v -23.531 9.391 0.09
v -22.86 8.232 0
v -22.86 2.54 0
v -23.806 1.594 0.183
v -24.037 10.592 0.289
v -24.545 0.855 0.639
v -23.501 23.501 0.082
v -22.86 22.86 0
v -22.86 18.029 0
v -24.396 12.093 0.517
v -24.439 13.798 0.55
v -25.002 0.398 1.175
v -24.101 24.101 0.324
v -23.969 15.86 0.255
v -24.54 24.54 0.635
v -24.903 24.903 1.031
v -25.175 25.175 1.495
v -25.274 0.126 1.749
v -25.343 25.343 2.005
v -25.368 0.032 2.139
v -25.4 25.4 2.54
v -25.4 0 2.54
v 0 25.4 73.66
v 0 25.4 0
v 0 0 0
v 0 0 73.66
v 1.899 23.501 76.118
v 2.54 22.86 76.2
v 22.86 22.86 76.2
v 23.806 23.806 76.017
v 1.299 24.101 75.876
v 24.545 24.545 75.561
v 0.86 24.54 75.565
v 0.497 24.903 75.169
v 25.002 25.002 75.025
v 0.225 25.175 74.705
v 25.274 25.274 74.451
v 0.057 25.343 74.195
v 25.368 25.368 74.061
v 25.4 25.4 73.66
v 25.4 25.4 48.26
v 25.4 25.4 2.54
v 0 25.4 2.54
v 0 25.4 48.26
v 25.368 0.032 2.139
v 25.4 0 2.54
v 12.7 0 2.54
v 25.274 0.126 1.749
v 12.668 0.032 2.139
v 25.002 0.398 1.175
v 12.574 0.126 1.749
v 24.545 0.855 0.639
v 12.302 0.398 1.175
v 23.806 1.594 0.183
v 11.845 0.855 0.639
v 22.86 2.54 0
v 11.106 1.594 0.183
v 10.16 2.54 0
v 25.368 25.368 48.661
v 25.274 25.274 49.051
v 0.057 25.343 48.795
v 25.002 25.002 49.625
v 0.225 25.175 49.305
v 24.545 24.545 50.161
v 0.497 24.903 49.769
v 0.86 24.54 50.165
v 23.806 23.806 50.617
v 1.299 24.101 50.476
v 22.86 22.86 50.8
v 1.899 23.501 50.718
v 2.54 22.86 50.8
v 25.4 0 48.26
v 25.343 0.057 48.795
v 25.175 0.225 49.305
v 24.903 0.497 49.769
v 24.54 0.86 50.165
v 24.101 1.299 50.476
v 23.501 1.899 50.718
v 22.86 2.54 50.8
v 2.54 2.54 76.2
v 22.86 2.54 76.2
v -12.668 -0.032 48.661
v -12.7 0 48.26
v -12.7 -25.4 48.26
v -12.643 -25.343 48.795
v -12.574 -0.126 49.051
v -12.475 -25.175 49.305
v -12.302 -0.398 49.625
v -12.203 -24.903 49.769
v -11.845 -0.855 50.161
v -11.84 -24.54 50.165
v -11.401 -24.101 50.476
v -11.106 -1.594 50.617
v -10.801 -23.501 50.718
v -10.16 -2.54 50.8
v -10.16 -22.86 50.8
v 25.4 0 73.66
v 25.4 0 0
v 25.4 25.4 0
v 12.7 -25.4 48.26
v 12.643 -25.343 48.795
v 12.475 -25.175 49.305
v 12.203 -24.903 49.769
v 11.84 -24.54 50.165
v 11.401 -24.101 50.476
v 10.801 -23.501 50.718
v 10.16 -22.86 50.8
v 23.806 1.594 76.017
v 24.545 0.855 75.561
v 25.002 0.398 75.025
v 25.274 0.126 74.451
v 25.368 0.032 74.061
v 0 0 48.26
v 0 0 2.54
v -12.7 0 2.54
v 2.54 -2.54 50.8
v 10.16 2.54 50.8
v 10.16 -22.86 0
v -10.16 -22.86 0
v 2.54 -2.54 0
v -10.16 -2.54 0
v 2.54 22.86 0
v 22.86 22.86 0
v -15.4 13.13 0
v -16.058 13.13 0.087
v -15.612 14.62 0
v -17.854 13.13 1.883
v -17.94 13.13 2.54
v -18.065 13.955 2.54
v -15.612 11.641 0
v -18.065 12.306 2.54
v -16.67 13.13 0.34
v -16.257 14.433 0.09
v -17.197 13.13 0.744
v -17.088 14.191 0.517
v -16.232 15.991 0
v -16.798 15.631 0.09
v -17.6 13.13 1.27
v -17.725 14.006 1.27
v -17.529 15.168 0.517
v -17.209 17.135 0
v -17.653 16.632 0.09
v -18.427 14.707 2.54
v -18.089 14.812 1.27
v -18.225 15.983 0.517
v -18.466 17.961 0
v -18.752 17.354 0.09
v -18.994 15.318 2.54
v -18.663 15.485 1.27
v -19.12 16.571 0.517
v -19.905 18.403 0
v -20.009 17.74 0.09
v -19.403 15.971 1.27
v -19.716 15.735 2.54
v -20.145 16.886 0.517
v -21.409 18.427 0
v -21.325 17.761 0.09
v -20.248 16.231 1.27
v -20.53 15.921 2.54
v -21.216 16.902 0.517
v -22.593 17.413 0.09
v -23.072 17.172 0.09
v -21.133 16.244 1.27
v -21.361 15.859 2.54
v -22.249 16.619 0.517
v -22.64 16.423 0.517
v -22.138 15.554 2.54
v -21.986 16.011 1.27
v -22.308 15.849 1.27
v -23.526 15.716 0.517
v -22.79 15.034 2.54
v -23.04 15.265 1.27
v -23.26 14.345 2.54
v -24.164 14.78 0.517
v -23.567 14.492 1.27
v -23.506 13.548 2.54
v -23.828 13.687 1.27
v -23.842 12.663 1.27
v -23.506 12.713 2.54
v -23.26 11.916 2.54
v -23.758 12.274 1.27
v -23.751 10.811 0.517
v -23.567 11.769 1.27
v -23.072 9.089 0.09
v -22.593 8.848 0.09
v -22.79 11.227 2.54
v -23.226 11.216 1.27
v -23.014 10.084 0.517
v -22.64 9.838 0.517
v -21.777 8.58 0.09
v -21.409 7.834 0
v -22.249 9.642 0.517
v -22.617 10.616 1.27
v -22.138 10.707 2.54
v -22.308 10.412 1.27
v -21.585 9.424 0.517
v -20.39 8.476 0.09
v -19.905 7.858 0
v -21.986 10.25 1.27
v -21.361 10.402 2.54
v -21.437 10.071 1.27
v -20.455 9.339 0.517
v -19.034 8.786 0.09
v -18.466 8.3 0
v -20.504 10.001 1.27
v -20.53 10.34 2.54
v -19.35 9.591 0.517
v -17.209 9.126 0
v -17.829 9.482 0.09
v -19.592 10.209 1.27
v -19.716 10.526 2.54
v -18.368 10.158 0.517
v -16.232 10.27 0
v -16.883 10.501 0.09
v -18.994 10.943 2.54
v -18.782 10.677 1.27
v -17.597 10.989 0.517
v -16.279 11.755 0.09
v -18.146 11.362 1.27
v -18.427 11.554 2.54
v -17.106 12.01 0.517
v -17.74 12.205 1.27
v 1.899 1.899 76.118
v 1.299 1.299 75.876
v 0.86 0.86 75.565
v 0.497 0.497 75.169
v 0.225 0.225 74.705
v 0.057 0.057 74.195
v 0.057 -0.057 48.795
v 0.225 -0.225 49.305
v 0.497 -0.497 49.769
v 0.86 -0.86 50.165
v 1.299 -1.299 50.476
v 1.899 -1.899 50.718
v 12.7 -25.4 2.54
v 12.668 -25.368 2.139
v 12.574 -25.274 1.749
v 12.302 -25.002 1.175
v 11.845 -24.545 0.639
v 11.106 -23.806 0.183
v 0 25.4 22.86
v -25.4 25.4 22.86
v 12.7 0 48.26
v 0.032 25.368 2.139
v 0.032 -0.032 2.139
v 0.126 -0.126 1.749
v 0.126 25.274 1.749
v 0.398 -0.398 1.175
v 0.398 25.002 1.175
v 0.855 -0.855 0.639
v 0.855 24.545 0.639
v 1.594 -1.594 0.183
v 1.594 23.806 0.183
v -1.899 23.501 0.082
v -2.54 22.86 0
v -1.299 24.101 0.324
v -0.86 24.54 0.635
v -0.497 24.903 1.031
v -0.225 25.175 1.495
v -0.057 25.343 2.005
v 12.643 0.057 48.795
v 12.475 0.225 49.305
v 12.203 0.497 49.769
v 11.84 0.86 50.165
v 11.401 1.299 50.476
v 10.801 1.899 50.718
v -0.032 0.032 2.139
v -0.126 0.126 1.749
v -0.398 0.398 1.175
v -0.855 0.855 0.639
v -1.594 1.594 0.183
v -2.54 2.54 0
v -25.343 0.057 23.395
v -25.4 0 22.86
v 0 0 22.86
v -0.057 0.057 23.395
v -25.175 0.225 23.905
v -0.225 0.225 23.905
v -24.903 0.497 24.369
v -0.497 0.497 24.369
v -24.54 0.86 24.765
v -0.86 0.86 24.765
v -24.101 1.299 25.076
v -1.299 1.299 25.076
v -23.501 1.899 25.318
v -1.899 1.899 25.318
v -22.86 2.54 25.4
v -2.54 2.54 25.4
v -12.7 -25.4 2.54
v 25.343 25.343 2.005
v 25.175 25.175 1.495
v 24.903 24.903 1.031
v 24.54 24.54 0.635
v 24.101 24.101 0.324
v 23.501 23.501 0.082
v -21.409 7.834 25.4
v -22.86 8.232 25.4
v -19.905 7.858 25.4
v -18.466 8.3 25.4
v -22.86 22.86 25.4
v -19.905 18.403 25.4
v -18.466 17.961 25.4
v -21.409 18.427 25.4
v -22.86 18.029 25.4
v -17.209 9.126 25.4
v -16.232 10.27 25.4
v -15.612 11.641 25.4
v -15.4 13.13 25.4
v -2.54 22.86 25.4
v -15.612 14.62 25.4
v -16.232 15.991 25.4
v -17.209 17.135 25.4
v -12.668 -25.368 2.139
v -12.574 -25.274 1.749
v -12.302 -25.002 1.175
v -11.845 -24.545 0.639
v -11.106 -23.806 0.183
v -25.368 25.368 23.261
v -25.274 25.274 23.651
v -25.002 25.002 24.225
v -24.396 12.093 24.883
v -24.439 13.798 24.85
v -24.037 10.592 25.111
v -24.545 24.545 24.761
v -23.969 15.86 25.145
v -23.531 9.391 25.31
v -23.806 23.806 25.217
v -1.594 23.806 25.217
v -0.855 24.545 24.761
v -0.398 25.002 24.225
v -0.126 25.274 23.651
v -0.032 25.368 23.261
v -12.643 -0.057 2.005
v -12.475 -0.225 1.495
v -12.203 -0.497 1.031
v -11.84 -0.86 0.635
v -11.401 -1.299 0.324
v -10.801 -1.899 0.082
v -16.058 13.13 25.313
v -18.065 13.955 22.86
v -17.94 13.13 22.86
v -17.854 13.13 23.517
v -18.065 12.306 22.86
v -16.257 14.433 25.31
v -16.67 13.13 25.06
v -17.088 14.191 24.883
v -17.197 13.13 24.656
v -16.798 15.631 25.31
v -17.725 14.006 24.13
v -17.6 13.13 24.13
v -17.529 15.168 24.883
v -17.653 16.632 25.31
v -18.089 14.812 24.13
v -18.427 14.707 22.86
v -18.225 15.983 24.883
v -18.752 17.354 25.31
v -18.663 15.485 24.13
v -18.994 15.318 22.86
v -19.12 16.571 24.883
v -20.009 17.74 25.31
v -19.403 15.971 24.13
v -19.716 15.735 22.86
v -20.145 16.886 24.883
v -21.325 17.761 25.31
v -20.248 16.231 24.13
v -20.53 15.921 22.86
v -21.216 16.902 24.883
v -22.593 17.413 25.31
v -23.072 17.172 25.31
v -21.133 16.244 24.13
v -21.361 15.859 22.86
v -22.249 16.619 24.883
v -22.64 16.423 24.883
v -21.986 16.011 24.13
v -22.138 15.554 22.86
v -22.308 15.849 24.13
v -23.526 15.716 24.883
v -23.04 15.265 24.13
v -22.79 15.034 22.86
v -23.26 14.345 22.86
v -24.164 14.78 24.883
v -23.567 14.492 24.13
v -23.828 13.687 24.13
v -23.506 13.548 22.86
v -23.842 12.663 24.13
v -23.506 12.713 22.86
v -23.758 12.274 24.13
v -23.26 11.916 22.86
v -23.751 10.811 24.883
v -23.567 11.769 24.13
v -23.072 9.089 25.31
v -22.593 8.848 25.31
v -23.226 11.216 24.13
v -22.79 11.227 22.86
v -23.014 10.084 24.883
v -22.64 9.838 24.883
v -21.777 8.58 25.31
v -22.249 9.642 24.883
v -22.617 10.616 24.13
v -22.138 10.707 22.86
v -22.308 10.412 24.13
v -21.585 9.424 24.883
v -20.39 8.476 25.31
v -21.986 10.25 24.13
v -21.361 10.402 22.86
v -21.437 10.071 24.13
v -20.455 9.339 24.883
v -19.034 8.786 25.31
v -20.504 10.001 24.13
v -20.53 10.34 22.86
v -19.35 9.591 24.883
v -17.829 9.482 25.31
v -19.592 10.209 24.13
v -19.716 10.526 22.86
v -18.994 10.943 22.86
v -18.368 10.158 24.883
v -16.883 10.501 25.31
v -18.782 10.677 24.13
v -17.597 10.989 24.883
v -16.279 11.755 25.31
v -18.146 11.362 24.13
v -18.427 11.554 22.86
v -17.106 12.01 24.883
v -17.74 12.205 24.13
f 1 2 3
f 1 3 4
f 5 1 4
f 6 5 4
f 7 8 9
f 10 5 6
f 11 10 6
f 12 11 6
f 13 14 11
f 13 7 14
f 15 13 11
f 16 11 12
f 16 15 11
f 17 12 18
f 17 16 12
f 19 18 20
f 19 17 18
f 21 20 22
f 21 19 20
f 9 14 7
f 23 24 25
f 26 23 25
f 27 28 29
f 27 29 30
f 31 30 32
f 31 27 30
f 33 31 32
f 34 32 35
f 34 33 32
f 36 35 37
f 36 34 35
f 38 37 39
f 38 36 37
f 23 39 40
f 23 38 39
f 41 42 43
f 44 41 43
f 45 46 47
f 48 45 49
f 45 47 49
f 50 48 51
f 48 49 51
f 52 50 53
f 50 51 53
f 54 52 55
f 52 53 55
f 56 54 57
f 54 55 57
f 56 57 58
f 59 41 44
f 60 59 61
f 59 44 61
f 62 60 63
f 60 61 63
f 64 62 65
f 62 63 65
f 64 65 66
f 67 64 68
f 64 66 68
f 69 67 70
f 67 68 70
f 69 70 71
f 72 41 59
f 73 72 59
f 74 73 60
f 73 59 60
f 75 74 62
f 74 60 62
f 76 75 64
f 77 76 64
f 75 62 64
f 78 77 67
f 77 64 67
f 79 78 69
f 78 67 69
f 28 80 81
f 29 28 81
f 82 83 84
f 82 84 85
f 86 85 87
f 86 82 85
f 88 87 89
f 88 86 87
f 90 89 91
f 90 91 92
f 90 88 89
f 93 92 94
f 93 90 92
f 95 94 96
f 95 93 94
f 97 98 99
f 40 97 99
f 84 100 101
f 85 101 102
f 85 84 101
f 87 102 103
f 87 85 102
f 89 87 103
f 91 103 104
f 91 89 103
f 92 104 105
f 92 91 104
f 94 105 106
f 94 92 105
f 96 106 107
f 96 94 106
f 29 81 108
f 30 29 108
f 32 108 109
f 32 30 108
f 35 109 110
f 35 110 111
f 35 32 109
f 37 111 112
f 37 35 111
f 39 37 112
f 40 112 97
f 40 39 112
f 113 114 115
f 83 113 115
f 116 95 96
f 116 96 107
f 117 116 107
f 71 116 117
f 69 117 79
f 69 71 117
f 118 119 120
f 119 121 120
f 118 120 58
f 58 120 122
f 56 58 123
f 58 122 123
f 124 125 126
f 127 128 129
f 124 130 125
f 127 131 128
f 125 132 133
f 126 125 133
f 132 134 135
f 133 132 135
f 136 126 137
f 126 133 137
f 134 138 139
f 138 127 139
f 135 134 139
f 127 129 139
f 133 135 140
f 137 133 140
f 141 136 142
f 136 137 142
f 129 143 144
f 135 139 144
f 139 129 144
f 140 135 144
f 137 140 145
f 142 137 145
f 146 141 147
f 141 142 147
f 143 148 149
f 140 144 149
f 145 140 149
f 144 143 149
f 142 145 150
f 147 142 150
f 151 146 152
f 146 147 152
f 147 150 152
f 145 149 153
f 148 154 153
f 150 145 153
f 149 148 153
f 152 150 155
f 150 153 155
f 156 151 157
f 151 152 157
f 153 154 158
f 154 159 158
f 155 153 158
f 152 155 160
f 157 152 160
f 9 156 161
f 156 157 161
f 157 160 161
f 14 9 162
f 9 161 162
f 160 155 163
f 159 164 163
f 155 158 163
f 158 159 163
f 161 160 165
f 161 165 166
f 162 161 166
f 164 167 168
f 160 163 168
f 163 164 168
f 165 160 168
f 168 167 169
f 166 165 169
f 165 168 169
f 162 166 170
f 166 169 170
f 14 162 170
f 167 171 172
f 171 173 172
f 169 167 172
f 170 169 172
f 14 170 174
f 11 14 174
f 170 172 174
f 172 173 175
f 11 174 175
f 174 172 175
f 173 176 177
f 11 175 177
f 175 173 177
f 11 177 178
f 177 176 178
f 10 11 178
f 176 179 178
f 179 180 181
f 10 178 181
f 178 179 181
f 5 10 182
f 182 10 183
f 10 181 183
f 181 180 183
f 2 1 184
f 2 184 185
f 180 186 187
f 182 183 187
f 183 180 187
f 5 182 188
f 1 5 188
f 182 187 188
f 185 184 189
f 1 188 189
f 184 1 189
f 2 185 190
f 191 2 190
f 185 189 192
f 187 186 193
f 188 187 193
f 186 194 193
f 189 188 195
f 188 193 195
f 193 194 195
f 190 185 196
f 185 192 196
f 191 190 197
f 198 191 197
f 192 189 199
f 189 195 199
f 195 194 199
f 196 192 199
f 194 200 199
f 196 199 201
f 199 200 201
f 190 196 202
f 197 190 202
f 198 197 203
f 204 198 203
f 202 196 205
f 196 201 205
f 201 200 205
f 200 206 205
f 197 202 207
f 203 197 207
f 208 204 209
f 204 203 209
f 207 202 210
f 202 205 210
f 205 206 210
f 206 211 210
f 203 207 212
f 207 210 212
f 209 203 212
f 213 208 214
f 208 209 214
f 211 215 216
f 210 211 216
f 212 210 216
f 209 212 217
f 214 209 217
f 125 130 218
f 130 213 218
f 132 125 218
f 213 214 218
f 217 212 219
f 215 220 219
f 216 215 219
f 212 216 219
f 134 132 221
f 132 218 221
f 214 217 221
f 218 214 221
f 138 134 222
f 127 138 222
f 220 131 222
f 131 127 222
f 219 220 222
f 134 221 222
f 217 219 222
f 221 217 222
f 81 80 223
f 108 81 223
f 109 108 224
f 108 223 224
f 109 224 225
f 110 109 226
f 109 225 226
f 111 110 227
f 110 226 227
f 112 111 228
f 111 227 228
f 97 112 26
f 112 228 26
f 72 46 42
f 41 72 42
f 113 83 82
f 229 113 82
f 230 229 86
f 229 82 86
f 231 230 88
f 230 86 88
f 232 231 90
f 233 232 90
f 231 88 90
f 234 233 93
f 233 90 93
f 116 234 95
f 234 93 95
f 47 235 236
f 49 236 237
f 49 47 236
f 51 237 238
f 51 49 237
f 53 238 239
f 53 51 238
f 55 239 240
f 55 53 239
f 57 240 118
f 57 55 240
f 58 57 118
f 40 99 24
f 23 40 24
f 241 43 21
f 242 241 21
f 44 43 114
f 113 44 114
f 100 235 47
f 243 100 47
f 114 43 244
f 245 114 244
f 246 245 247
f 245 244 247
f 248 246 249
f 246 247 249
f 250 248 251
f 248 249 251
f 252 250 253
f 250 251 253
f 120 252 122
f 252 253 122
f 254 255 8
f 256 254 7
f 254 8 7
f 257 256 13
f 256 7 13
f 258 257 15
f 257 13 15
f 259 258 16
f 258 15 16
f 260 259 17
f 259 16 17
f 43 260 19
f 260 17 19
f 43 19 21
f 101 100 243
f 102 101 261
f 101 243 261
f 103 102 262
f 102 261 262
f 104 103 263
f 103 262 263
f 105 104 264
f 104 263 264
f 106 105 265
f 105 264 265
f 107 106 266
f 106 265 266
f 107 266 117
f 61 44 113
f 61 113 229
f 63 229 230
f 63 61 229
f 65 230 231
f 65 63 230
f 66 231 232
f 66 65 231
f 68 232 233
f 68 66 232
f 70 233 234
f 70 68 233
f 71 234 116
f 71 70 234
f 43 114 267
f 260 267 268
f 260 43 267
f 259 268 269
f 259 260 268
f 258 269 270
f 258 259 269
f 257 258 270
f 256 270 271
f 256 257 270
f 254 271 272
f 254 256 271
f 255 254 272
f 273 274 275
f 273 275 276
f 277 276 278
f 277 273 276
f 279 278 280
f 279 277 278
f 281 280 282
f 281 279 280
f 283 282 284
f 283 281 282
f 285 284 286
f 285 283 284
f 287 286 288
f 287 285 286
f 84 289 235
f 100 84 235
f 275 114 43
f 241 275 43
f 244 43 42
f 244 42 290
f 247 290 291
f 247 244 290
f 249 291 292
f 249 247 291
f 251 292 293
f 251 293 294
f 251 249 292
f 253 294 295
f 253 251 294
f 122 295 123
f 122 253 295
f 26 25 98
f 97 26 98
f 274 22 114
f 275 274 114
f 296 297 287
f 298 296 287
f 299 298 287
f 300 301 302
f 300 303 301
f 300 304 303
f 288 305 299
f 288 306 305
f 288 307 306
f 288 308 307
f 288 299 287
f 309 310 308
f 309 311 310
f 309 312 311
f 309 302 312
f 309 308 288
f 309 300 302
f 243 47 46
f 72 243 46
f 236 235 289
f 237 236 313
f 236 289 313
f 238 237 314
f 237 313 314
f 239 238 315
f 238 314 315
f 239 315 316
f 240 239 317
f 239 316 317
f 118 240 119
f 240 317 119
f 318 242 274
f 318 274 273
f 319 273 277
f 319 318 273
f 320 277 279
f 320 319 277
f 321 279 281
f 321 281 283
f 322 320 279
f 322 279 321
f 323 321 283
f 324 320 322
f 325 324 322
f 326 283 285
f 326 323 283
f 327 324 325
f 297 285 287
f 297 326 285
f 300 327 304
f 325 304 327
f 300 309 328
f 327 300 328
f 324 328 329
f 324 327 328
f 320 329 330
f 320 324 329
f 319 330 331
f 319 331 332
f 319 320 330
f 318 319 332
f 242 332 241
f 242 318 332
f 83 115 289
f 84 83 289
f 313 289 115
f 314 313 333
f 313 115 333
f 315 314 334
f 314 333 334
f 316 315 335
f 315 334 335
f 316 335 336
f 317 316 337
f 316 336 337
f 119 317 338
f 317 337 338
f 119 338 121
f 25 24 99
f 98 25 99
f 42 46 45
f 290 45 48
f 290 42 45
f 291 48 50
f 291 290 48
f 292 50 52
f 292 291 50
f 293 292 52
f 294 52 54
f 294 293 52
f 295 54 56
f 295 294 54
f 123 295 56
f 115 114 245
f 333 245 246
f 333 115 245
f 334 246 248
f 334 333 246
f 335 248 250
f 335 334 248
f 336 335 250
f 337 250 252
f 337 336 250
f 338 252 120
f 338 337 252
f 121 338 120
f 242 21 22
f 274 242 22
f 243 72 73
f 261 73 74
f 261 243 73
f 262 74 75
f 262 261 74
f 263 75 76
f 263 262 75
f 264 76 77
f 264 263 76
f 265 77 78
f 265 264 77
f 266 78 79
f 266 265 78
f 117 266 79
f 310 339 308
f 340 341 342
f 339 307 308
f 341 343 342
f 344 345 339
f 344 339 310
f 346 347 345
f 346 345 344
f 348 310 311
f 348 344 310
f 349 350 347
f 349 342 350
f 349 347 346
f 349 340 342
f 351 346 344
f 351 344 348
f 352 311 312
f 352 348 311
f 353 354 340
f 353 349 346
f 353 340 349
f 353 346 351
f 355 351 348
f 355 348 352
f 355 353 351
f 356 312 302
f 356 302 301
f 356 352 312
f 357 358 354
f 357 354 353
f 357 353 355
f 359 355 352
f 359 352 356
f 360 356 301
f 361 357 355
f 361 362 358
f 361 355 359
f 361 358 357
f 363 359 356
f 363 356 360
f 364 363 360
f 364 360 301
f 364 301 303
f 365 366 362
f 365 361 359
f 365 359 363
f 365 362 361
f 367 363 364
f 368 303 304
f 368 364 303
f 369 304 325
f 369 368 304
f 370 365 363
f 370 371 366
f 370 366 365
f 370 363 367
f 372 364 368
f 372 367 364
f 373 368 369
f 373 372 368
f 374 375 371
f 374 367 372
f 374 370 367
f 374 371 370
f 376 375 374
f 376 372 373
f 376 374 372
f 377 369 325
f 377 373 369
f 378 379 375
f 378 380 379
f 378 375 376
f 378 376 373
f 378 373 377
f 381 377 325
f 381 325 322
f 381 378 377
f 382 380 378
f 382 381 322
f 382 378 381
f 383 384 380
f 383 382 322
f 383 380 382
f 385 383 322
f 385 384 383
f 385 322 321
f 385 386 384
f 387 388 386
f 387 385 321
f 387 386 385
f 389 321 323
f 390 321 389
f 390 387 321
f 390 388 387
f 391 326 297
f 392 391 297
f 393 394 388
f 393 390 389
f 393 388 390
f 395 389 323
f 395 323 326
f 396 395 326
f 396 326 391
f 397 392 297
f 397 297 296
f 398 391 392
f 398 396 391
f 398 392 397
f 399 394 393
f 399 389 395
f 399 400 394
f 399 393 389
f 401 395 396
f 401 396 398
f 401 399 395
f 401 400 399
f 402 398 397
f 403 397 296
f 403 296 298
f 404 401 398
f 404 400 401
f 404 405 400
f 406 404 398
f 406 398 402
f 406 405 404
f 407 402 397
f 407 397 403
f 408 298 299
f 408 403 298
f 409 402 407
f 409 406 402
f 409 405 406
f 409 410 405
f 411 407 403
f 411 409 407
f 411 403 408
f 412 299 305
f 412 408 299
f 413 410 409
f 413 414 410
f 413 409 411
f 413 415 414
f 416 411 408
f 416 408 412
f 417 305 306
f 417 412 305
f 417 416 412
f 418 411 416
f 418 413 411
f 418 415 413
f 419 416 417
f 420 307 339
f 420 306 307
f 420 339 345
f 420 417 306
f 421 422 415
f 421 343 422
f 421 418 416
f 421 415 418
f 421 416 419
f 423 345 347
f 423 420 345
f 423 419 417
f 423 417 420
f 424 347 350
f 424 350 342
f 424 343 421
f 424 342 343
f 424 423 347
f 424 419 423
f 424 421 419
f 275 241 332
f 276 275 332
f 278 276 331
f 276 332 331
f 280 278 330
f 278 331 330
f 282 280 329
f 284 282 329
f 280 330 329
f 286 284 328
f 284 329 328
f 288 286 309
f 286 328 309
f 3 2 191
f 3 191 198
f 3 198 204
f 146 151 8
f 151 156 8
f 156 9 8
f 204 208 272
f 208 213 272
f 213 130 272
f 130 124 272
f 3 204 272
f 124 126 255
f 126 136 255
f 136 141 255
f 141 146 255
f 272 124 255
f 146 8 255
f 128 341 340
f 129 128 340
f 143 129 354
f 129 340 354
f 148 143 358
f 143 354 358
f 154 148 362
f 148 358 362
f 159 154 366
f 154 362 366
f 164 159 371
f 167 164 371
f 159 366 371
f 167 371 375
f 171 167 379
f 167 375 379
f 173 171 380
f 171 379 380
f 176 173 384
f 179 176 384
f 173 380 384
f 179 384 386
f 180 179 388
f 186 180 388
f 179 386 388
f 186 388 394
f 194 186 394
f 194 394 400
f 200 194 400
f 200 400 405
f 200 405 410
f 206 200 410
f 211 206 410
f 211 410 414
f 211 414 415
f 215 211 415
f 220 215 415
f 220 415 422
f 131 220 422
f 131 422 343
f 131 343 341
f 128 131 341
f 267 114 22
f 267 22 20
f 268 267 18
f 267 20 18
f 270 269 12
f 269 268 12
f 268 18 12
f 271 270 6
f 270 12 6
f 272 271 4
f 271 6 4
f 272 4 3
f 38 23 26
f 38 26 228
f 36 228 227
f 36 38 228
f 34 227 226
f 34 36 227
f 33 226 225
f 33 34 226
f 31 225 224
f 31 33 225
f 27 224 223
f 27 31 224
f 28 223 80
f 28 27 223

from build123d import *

# Parameters (mm, degrees)
F1_DEPTH       = 25.4
F3_DEPTH       = 76.2
F4_DEPTH       = 50.8
F5_R           = 2.7983271334
F6_DEPTH       = 40.64
F7_T1_DEPTH    = 38.1
F7_T3_DEPTH    = 38.1
F7_2_T1_DEPTH  = 31.75
F7_2_T3_DEPTH  = 19.05
F7_2_T5_DEPTH  = 38.1
F7_2_T7_DEPTH  = 38.1
F7_2_T9_DEPTH  = 31.75
F7_2_T11_DEPTH = 19.05
F7_2_T13_DEPTH = 38.1
F7_2_T15_DEPTH = 38.1
F7_2_T21_DEPTH = 38.1
F7_2_T25_DEPTH = 25.4
F7_2_T32_DEPTH = 38.1
F7_2_T36_DEPTH = 25.4
F7_2_T43_DEPTH = 38.1
F7_2_T47_DEPTH = 25.4
F7_2_T54_DEPTH = 38.1
F7_2_T58_DEPTH = 25.4
F7_3_T1_DEPTH  = 38.1
F7_3_T3_DEPTH  = 38.1


# Not quite as in the source:
# - a fillet or chamfer that OpenCascade refuses, or shapes differently, is made with other operations: its cross-section is extruded or revolved along the edge and cut away or added


with BuildPart() as f1:
    # F0 (on Top) → F1 (new body)
    with BuildSketch(Plane.XY):
        Polygon((-12.7, 0), (0, 0), (0, 25.4), (-25.4, 25.4), (-25.4, 0), align=None)
    extrude(amount=F1_DEPTH)

    # F5 (on face) → F6 (cut)
    with BuildSketch(Plane.XY.offset(25.4)):
        with Locations((-20.7387898117, 13.1304748356)):
            Circle(F5_R)
    extrude(amount=-F6_DEPTH, mode=Mode.SUBTRACT)

    # F7: fillet of radius 2.54 on 10 edges, made by hand

    # F7_s2 → F7_t1 (cut)
    with BuildSketch(Plane.YZ.offset(-31.75)):
        with BuildLine():
            ThreePointArc((0, 22.86), (0.7439487758, 24.6560512242), (2.54, 25.4))
            Line((2.54, 25.4), (0, 25.4))
            Line((0, 25.4), (0, 22.86))
        make_face()
        with BuildLine():
            ThreePointArc((22.86, 25.4), (24.6560512242, 24.6560512242), (25.4, 22.86))
            Line((25.4, 22.86), (25.4, 25.4))
            Line((25.4, 25.4), (22.86, 25.4))
        make_face()
        with BuildLine():
            ThreePointArc((0, 2.54), (0.7439487758, 0.7439487758), (2.54, 0))
            Line((2.54, 0), (0, 0))
            Line((0, 0), (0, 2.54))
        make_face()
        with BuildLine():
            ThreePointArc((22.86, 0), (24.6560512242, 0.7439487758), (25.4, 2.54))
            Line((25.4, 2.54), (25.4, 0))
            Line((25.4, 0), (22.86, 0))
        make_face()
    extrude(amount=F7_T1_DEPTH, mode=Mode.SUBTRACT)

    # F7_s4 → F7_t3 (cut)
    with BuildSketch(Plane.XZ.offset(-31.75)):
        with BuildLine():
            ThreePointArc((0, 22.86), (-0.7439487758, 24.6560512242), (-2.54, 25.4))
            Line((-2.54, 25.4), (0, 25.4))
            Line((0, 25.4), (0, 22.86))
        make_face()
        with BuildLine():
            ThreePointArc((-25.4, 22.86), (-24.6560512242, 24.6560512242), (-22.86, 25.4))
            Line((-22.86, 25.4), (-25.4, 25.4))
            Line((-25.4, 25.4), (-25.4, 22.86))
        make_face()
        with BuildLine():
            ThreePointArc((0, 2.54), (-0.7439487758, 0.7439487758), (-2.54, 0))
            Line((-2.54, 0), (0, 0))
            Line((0, 0), (0, 2.54))
        make_face()
        with BuildLine():
            ThreePointArc((-22.86, 0), (-24.6560512242, 0.7439487758), (-25.4, 2.54))
            Line((-25.4, 2.54), (-25.4, 0))
            Line((-25.4, 0), (-22.86, 0))
        make_face()
    extrude(amount=F7_T3_DEPTH, mode=Mode.SUBTRACT)

    # F7_s5 → F7_t6 (revolve, cut)
    with BuildSketch(Plane.XZ.offset(-13.1304748356)):
        with BuildLine():
            ThreePointArc((-15.4004626784, 25.4), (-17.1965139026, 24.6560512242), (-17.9404626784, 22.86))
            Line((-17.9404626784, 22.86), (-17.9404626784, 25.4))
            Line((-17.9404626784, 25.4), (-15.4004626784, 25.4))
        make_face()
    revolve(axis=Axis((-20.7387898117, 13.1304748356, 25.4), (0, 0, 1)), mode=Mode.SUBTRACT)

    # F7_s7 → F7_t8 (revolve, cut)
    with BuildSketch(Plane.XZ.offset(-13.1304748356)):
        with BuildLine():
            ThreePointArc((-15.4004626784, 0), (-17.1965139026, 0.7439487758), (-17.9404626784, 2.54))
            Line((-17.9404626784, 2.54), (-17.9404626784, 0))
            Line((-17.9404626784, 0), (-15.4004626784, 0))
        make_face()
    revolve(axis=Axis((-20.7387898117, 13.1304748356, 0), (0, 0, 1)), mode=Mode.SUBTRACT)


with BuildPart() as f3:
    # F2 (on Top) → F3 (new body)
    with BuildSketch(Plane.XY):
        Polygon((0, 25.4), (0, 0), (12.7, 0), (25.4, 0), (25.4, 25.4), align=None)
    extrude(amount=F3_DEPTH)

    # F7#3: fillet of radius 2.54 on 4 edges, made by hand

    # F7_3_s2 → F7_3_t1 (cut)
    with BuildSketch(Plane.XZ.offset(-31.75)):
        with BuildLine():
            ThreePointArc((0, 73.66), (0.7439487758, 75.4560512242), (2.54, 76.2))
            Line((2.54, 76.2), (0, 76.2))
            Line((0, 76.2), (0, 73.66))
        make_face()
        with BuildLine():
            ThreePointArc((22.86, 76.2), (24.6560512242, 75.4560512242), (25.4, 73.66))
            Line((25.4, 73.66), (25.4, 76.2))
            Line((25.4, 76.2), (22.86, 76.2))
        make_face()
    extrude(amount=F7_3_T1_DEPTH, mode=Mode.SUBTRACT)

    # F7_3_s4 → F7_3_t3 (cut)
    with BuildSketch(Plane.YZ.offset(-6.35)):
        with BuildLine():
            ThreePointArc((2.54, 76.2), (0.7439487758, 75.4560512242), (0, 73.66))
            Line((0, 73.66), (0, 76.2))
            Line((0, 76.2), (2.54, 76.2))
        make_face()
        with BuildLine():
            ThreePointArc((22.86, 76.2), (24.6560512242, 75.4560512242), (25.4, 73.66))
            Line((25.4, 73.66), (25.4, 76.2))
            Line((25.4, 76.2), (22.86, 76.2))
        make_face()
    extrude(amount=F7_3_T3_DEPTH, mode=Mode.SUBTRACT)


with BuildPart() as f4:
    # F2 (on Top) → F4 (new body)
    with BuildSketch(Plane.XY):
        Polygon((0, 25.4), (0, 0), (12.7, 0), (25.4, 0), (25.4, 25.4), align=None)
        Polygon((12.7, 0), (0, 0), (-12.7, 0), (-12.7, -25.4), (12.7, -25.4), align=None)
    extrude(amount=F4_DEPTH)

    # F7#2: fillet of radius 2.54 on 16 edges, made by hand

    # F7_2_s2 → F7_2_t1 (cut)
    with BuildSketch(Plane.XZ.offset(-31.75)):
        with BuildLine():
            ThreePointArc((0, 2.54), (0.7439487758, 0.7439487758), (2.54, 0))
            Line((2.54, 0), (0, 0))
            Line((0, 0), (0, 2.54))
        make_face()
        with BuildLine():
            ThreePointArc((0, 48.26), (0.7439487758, 50.0560512242), (2.54, 50.8))
            Line((2.54, 50.8), (0, 50.8))
            Line((0, 50.8), (0, 48.26))
        make_face()
    extrude(amount=F7_2_T1_DEPTH, mode=Mode.SUBTRACT)

    # F7_2_s4 → F7_2_t3 (cut)
    with BuildSketch(Plane.YZ.offset(-19.05)):
        with BuildLine():
            ThreePointArc((0, 48.26), (-0.7439487758, 50.0560512242), (-2.54, 50.8))
            Line((-2.54, 50.8), (0, 50.8))
            Line((0, 50.8), (0, 48.26))
        make_face()
        with BuildLine():
            ThreePointArc((0, 2.54), (-0.7439487758, 0.7439487758), (-2.54, 0))
            Line((-2.54, 0), (0, 0))
            Line((0, 0), (0, 2.54))
        make_face()
    extrude(amount=F7_2_T3_DEPTH, mode=Mode.SUBTRACT)

    # F7_2_s6 → F7_2_t5 (cut)
    with BuildSketch(Plane.XZ.offset(-6.35)):
        with BuildLine():
            ThreePointArc((-12.7, 48.26), (-11.9560512242, 50.0560512242), (-10.16, 50.8))
            Line((-10.16, 50.8), (-12.7, 50.8))
            Line((-12.7, 50.8), (-12.7, 48.26))
        make_face()
        with BuildLine():
            ThreePointArc((-12.7, 2.54), (-11.9560512242, 0.7439487758), (-10.16, 0))
            Line((-10.16, 0), (-12.7, 0))
            Line((-12.7, 0), (-12.7, 2.54))
        make_face()
    extrude(amount=F7_2_T5_DEPTH, mode=Mode.SUBTRACT)

    # F7_2_s8 → F7_2_t7 (cut)
    with BuildSketch(Plane.YZ.offset(-19.05)):
        with BuildLine():
            ThreePointArc((-25.4, 48.26), (-24.6560512242, 50.0560512242), (-22.86, 50.8))
            Line((-22.86, 50.8), (-25.4, 50.8))
            Line((-25.4, 50.8), (-25.4, 48.26))
        make_face()
        with BuildLine():
            ThreePointArc((-25.4, 2.54), (-24.6560512242, 0.7439487758), (-22.86, 0))
            Line((-22.86, 0), (-25.4, 0))
            Line((-25.4, 0), (-25.4, 2.54))
        make_face()
    extrude(amount=F7_2_T7_DEPTH, mode=Mode.SUBTRACT)

    # F7_2_s10 → F7_2_t9 (cut)
    with BuildSketch(Plane.XZ):
        with BuildLine():
            ThreePointArc((12.7, 48.26), (11.9560512242, 50.0560512242), (10.16, 50.8))
            Line((10.16, 50.8), (12.7, 50.8))
            Line((12.7, 50.8), (12.7, 48.26))
        make_face()
        with BuildLine():
            ThreePointArc((12.7, 2.54), (11.9560512242, 0.7439487758), (10.16, 0))
            Line((10.16, 0), (12.7, 0))
            Line((12.7, 0), (12.7, 2.54))
        make_face()
    extrude(amount=F7_2_T9_DEPTH, mode=Mode.SUBTRACT)

    # F7_2_s12 → F7_2_t11 (cut)
    with BuildSketch(Plane.YZ.offset(12.7)):
        with BuildLine():
            ThreePointArc((0, 48.26), (0.7439487758, 50.0560512242), (2.54, 50.8))
            Line((2.54, 50.8), (0, 50.8))
            Line((0, 50.8), (0, 48.26))
        make_face()
        with BuildLine():
            ThreePointArc((0, 2.54), (0.7439487758, 0.7439487758), (2.54, 0))
            Line((2.54, 0), (0, 0))
            Line((0, 0), (0, 2.54))
        make_face()
    extrude(amount=F7_2_T11_DEPTH, mode=Mode.SUBTRACT)

    # F7_2_s14 → F7_2_t13 (cut)
    with BuildSketch(Plane.XZ.offset(-31.75)):
        with BuildLine():
            ThreePointArc((25.4, 48.26), (24.6560512242, 50.0560512242), (22.86, 50.8))
            Line((22.86, 50.8), (25.4, 50.8))
            Line((25.4, 50.8), (25.4, 48.26))
        make_face()
        with BuildLine():
            ThreePointArc((25.4, 2.54), (24.6560512242, 0.7439487758), (22.86, 0))
            Line((22.86, 0), (25.4, 0))
            Line((25.4, 0), (25.4, 2.54))
        make_face()
    extrude(amount=F7_2_T13_DEPTH, mode=Mode.SUBTRACT)

    # F7_2_s16 → F7_2_t15 (cut)
    with BuildSketch(Plane.YZ.offset(-6.35)):
        with BuildLine():
            ThreePointArc((25.4, 48.26), (24.6560512242, 50.0560512242), (22.86, 50.8))
            Line((22.86, 50.8), (25.4, 50.8))
            Line((25.4, 50.8), (25.4, 48.26))
        make_face()
        with BuildLine():
            ThreePointArc((25.4, 2.54), (24.6560512242, 0.7439487758), (22.86, 0))
            Line((22.86, 0), (25.4, 0))
            Line((25.4, 0), (25.4, 2.54))
        make_face()
    extrude(amount=F7_2_T15_DEPTH, mode=Mode.SUBTRACT)


with BuildPart() as f7_2_tool19:
    # F7_2_s20 → F7_2_t21 (new body)
    with BuildSketch(Plane.XZ.offset(-31.75)):
        with BuildLine():
            ThreePointArc((0, 2.54), (0.7439487758, 0.7439487758), (2.54, 0))
            Line((2.54, 0), (0, 0))
            Line((0, 0), (0, 2.54))
        make_face()
    extrude(amount=F7_2_T21_DEPTH)

    split(bisect_by=Plane.XZ, keep=Keep.TOP)


with BuildPart() as f7_2_tool23:
    # F7_2_s24 → F7_2_t25 (new body)
    with BuildSketch(Plane.YZ.offset(6.35)):
        with BuildLine():
            ThreePointArc((0, 2.54), (-0.7439487758, 0.7439487758), (-2.54, 0))
            Line((-2.54, 0), (0, 0))
            Line((0, 0), (0, 2.54))
        make_face()
    extrude(amount=-F7_2_T25_DEPTH)

    split(bisect_by=Plane.YZ, keep=Keep.TOP)


with BuildPart() as f7_2_tool19_1:
    add(f7_2_tool19.part)

    # F7_2_t27: intersect F7_2_tool23
    add(f7_2_tool23.part, mode=Mode.INTERSECT)


with BuildPart() as f4_1:
    add(f4.part)

    # F7_2_t17: cut F7_2_tool19
    add(f7_2_tool19_1.part, mode=Mode.SUBTRACT)


with BuildPart() as f7_2_tool30:
    # F7_2_s31 → F7_2_t32 (new body)
    with BuildSketch(Plane.XZ.offset(-31.75)):
        with BuildLine():
            ThreePointArc((0, 48.26), (0.7439487758, 50.0560512242), (2.54, 50.8))
            Line((2.54, 50.8), (0, 50.8))
            Line((0, 50.8), (0, 48.26))
        make_face()
    extrude(amount=F7_2_T32_DEPTH)

    split(bisect_by=Plane.XZ, keep=Keep.TOP)


with BuildPart() as f7_2_tool34:
    # F7_2_s35 → F7_2_t36 (new body)
    with BuildSketch(Plane.YZ.offset(6.35)):
        with BuildLine():
            ThreePointArc((0, 48.26), (-0.7439487758, 50.0560512242), (-2.54, 50.8))
            Line((-2.54, 50.8), (0, 50.8))
            Line((0, 50.8), (0, 48.26))
        make_face()
    extrude(amount=-F7_2_T36_DEPTH)

    split(bisect_by=Plane.YZ, keep=Keep.TOP)


with BuildPart() as f7_2_tool30_1:
    add(f7_2_tool30.part)

    # F7_2_t38: intersect F7_2_tool34
    add(f7_2_tool34.part, mode=Mode.INTERSECT)


with BuildPart() as f4_2:
    add(f4_1.part)

    # F7_2_t28: cut F7_2_tool30
    add(f7_2_tool30_1.part, mode=Mode.SUBTRACT)


with BuildPart() as f7_2_tool41:
    # F7_2_s42 → F7_2_t43 (new body)
    with BuildSketch(Plane.XZ.offset(31.75)):
        with BuildLine():
            ThreePointArc((12.7, 48.26), (11.9560512242, 50.0560512242), (10.16, 50.8))
            Line((10.16, 50.8), (12.7, 50.8))
            Line((12.7, 50.8), (12.7, 48.26))
        make_face()
    extrude(amount=-F7_2_T43_DEPTH)

    split(bisect_by=Plane.XZ, keep=Keep.BOTTOM)


with BuildPart() as f7_2_tool45:
    # F7_2_s46 → F7_2_t47 (new body)
    with BuildSketch(Plane.YZ.offset(6.35)):
        with BuildLine():
            ThreePointArc((0, 48.26), (0.7439487758, 50.0560512242), (2.54, 50.8))
            Line((2.54, 50.8), (0, 50.8))
            Line((0, 50.8), (0, 48.26))
        make_face()
    extrude(amount=F7_2_T47_DEPTH)

    split(bisect_by=Plane.YZ.offset(12.7), keep=Keep.BOTTOM)


with BuildPart() as f7_2_tool41_1:
    add(f7_2_tool41.part)

    # F7_2_t49: intersect F7_2_tool45
    add(f7_2_tool45.part, mode=Mode.INTERSECT)


with BuildPart() as f4_3:
    add(f4_2.part)

    # F7_2_t39: cut F7_2_tool41
    add(f7_2_tool41_1.part, mode=Mode.SUBTRACT)


with BuildPart() as f7_2_tool52:
    # F7_2_s53 → F7_2_t54 (new body)
    with BuildSketch(Plane.XZ.offset(31.75)):
        with BuildLine():
            ThreePointArc((12.7, 2.54), (11.9560512242, 0.7439487758), (10.16, 0))
            Line((10.16, 0), (12.7, 0))
            Line((12.7, 0), (12.7, 2.54))
        make_face()
    extrude(amount=-F7_2_T54_DEPTH)

    split(bisect_by=Plane.XZ, keep=Keep.BOTTOM)


with BuildPart() as f7_2_tool56:
    # F7_2_s57 → F7_2_t58 (new body)
    with BuildSketch(Plane.YZ.offset(6.35)):
        with BuildLine():
            ThreePointArc((0, 2.54), (0.7439487758, 0.7439487758), (2.54, 0))
            Line((2.54, 0), (0, 0))
            Line((0, 0), (0, 2.54))
        make_face()
    extrude(amount=F7_2_T58_DEPTH)

    split(bisect_by=Plane.YZ.offset(12.7), keep=Keep.BOTTOM)


with BuildPart() as f7_2_tool52_1:
    add(f7_2_tool52.part)

    # F7_2_t60: intersect F7_2_tool56
    add(f7_2_tool56.part, mode=Mode.INTERSECT)


with BuildPart() as f4_4:
    add(f4_3.part)

    # F7_2_t50: cut F7_2_tool52
    add(f7_2_tool52_1.part, mode=Mode.SUBTRACT)


solid = Compound([f1.part, f3.part, f4_4.part])
